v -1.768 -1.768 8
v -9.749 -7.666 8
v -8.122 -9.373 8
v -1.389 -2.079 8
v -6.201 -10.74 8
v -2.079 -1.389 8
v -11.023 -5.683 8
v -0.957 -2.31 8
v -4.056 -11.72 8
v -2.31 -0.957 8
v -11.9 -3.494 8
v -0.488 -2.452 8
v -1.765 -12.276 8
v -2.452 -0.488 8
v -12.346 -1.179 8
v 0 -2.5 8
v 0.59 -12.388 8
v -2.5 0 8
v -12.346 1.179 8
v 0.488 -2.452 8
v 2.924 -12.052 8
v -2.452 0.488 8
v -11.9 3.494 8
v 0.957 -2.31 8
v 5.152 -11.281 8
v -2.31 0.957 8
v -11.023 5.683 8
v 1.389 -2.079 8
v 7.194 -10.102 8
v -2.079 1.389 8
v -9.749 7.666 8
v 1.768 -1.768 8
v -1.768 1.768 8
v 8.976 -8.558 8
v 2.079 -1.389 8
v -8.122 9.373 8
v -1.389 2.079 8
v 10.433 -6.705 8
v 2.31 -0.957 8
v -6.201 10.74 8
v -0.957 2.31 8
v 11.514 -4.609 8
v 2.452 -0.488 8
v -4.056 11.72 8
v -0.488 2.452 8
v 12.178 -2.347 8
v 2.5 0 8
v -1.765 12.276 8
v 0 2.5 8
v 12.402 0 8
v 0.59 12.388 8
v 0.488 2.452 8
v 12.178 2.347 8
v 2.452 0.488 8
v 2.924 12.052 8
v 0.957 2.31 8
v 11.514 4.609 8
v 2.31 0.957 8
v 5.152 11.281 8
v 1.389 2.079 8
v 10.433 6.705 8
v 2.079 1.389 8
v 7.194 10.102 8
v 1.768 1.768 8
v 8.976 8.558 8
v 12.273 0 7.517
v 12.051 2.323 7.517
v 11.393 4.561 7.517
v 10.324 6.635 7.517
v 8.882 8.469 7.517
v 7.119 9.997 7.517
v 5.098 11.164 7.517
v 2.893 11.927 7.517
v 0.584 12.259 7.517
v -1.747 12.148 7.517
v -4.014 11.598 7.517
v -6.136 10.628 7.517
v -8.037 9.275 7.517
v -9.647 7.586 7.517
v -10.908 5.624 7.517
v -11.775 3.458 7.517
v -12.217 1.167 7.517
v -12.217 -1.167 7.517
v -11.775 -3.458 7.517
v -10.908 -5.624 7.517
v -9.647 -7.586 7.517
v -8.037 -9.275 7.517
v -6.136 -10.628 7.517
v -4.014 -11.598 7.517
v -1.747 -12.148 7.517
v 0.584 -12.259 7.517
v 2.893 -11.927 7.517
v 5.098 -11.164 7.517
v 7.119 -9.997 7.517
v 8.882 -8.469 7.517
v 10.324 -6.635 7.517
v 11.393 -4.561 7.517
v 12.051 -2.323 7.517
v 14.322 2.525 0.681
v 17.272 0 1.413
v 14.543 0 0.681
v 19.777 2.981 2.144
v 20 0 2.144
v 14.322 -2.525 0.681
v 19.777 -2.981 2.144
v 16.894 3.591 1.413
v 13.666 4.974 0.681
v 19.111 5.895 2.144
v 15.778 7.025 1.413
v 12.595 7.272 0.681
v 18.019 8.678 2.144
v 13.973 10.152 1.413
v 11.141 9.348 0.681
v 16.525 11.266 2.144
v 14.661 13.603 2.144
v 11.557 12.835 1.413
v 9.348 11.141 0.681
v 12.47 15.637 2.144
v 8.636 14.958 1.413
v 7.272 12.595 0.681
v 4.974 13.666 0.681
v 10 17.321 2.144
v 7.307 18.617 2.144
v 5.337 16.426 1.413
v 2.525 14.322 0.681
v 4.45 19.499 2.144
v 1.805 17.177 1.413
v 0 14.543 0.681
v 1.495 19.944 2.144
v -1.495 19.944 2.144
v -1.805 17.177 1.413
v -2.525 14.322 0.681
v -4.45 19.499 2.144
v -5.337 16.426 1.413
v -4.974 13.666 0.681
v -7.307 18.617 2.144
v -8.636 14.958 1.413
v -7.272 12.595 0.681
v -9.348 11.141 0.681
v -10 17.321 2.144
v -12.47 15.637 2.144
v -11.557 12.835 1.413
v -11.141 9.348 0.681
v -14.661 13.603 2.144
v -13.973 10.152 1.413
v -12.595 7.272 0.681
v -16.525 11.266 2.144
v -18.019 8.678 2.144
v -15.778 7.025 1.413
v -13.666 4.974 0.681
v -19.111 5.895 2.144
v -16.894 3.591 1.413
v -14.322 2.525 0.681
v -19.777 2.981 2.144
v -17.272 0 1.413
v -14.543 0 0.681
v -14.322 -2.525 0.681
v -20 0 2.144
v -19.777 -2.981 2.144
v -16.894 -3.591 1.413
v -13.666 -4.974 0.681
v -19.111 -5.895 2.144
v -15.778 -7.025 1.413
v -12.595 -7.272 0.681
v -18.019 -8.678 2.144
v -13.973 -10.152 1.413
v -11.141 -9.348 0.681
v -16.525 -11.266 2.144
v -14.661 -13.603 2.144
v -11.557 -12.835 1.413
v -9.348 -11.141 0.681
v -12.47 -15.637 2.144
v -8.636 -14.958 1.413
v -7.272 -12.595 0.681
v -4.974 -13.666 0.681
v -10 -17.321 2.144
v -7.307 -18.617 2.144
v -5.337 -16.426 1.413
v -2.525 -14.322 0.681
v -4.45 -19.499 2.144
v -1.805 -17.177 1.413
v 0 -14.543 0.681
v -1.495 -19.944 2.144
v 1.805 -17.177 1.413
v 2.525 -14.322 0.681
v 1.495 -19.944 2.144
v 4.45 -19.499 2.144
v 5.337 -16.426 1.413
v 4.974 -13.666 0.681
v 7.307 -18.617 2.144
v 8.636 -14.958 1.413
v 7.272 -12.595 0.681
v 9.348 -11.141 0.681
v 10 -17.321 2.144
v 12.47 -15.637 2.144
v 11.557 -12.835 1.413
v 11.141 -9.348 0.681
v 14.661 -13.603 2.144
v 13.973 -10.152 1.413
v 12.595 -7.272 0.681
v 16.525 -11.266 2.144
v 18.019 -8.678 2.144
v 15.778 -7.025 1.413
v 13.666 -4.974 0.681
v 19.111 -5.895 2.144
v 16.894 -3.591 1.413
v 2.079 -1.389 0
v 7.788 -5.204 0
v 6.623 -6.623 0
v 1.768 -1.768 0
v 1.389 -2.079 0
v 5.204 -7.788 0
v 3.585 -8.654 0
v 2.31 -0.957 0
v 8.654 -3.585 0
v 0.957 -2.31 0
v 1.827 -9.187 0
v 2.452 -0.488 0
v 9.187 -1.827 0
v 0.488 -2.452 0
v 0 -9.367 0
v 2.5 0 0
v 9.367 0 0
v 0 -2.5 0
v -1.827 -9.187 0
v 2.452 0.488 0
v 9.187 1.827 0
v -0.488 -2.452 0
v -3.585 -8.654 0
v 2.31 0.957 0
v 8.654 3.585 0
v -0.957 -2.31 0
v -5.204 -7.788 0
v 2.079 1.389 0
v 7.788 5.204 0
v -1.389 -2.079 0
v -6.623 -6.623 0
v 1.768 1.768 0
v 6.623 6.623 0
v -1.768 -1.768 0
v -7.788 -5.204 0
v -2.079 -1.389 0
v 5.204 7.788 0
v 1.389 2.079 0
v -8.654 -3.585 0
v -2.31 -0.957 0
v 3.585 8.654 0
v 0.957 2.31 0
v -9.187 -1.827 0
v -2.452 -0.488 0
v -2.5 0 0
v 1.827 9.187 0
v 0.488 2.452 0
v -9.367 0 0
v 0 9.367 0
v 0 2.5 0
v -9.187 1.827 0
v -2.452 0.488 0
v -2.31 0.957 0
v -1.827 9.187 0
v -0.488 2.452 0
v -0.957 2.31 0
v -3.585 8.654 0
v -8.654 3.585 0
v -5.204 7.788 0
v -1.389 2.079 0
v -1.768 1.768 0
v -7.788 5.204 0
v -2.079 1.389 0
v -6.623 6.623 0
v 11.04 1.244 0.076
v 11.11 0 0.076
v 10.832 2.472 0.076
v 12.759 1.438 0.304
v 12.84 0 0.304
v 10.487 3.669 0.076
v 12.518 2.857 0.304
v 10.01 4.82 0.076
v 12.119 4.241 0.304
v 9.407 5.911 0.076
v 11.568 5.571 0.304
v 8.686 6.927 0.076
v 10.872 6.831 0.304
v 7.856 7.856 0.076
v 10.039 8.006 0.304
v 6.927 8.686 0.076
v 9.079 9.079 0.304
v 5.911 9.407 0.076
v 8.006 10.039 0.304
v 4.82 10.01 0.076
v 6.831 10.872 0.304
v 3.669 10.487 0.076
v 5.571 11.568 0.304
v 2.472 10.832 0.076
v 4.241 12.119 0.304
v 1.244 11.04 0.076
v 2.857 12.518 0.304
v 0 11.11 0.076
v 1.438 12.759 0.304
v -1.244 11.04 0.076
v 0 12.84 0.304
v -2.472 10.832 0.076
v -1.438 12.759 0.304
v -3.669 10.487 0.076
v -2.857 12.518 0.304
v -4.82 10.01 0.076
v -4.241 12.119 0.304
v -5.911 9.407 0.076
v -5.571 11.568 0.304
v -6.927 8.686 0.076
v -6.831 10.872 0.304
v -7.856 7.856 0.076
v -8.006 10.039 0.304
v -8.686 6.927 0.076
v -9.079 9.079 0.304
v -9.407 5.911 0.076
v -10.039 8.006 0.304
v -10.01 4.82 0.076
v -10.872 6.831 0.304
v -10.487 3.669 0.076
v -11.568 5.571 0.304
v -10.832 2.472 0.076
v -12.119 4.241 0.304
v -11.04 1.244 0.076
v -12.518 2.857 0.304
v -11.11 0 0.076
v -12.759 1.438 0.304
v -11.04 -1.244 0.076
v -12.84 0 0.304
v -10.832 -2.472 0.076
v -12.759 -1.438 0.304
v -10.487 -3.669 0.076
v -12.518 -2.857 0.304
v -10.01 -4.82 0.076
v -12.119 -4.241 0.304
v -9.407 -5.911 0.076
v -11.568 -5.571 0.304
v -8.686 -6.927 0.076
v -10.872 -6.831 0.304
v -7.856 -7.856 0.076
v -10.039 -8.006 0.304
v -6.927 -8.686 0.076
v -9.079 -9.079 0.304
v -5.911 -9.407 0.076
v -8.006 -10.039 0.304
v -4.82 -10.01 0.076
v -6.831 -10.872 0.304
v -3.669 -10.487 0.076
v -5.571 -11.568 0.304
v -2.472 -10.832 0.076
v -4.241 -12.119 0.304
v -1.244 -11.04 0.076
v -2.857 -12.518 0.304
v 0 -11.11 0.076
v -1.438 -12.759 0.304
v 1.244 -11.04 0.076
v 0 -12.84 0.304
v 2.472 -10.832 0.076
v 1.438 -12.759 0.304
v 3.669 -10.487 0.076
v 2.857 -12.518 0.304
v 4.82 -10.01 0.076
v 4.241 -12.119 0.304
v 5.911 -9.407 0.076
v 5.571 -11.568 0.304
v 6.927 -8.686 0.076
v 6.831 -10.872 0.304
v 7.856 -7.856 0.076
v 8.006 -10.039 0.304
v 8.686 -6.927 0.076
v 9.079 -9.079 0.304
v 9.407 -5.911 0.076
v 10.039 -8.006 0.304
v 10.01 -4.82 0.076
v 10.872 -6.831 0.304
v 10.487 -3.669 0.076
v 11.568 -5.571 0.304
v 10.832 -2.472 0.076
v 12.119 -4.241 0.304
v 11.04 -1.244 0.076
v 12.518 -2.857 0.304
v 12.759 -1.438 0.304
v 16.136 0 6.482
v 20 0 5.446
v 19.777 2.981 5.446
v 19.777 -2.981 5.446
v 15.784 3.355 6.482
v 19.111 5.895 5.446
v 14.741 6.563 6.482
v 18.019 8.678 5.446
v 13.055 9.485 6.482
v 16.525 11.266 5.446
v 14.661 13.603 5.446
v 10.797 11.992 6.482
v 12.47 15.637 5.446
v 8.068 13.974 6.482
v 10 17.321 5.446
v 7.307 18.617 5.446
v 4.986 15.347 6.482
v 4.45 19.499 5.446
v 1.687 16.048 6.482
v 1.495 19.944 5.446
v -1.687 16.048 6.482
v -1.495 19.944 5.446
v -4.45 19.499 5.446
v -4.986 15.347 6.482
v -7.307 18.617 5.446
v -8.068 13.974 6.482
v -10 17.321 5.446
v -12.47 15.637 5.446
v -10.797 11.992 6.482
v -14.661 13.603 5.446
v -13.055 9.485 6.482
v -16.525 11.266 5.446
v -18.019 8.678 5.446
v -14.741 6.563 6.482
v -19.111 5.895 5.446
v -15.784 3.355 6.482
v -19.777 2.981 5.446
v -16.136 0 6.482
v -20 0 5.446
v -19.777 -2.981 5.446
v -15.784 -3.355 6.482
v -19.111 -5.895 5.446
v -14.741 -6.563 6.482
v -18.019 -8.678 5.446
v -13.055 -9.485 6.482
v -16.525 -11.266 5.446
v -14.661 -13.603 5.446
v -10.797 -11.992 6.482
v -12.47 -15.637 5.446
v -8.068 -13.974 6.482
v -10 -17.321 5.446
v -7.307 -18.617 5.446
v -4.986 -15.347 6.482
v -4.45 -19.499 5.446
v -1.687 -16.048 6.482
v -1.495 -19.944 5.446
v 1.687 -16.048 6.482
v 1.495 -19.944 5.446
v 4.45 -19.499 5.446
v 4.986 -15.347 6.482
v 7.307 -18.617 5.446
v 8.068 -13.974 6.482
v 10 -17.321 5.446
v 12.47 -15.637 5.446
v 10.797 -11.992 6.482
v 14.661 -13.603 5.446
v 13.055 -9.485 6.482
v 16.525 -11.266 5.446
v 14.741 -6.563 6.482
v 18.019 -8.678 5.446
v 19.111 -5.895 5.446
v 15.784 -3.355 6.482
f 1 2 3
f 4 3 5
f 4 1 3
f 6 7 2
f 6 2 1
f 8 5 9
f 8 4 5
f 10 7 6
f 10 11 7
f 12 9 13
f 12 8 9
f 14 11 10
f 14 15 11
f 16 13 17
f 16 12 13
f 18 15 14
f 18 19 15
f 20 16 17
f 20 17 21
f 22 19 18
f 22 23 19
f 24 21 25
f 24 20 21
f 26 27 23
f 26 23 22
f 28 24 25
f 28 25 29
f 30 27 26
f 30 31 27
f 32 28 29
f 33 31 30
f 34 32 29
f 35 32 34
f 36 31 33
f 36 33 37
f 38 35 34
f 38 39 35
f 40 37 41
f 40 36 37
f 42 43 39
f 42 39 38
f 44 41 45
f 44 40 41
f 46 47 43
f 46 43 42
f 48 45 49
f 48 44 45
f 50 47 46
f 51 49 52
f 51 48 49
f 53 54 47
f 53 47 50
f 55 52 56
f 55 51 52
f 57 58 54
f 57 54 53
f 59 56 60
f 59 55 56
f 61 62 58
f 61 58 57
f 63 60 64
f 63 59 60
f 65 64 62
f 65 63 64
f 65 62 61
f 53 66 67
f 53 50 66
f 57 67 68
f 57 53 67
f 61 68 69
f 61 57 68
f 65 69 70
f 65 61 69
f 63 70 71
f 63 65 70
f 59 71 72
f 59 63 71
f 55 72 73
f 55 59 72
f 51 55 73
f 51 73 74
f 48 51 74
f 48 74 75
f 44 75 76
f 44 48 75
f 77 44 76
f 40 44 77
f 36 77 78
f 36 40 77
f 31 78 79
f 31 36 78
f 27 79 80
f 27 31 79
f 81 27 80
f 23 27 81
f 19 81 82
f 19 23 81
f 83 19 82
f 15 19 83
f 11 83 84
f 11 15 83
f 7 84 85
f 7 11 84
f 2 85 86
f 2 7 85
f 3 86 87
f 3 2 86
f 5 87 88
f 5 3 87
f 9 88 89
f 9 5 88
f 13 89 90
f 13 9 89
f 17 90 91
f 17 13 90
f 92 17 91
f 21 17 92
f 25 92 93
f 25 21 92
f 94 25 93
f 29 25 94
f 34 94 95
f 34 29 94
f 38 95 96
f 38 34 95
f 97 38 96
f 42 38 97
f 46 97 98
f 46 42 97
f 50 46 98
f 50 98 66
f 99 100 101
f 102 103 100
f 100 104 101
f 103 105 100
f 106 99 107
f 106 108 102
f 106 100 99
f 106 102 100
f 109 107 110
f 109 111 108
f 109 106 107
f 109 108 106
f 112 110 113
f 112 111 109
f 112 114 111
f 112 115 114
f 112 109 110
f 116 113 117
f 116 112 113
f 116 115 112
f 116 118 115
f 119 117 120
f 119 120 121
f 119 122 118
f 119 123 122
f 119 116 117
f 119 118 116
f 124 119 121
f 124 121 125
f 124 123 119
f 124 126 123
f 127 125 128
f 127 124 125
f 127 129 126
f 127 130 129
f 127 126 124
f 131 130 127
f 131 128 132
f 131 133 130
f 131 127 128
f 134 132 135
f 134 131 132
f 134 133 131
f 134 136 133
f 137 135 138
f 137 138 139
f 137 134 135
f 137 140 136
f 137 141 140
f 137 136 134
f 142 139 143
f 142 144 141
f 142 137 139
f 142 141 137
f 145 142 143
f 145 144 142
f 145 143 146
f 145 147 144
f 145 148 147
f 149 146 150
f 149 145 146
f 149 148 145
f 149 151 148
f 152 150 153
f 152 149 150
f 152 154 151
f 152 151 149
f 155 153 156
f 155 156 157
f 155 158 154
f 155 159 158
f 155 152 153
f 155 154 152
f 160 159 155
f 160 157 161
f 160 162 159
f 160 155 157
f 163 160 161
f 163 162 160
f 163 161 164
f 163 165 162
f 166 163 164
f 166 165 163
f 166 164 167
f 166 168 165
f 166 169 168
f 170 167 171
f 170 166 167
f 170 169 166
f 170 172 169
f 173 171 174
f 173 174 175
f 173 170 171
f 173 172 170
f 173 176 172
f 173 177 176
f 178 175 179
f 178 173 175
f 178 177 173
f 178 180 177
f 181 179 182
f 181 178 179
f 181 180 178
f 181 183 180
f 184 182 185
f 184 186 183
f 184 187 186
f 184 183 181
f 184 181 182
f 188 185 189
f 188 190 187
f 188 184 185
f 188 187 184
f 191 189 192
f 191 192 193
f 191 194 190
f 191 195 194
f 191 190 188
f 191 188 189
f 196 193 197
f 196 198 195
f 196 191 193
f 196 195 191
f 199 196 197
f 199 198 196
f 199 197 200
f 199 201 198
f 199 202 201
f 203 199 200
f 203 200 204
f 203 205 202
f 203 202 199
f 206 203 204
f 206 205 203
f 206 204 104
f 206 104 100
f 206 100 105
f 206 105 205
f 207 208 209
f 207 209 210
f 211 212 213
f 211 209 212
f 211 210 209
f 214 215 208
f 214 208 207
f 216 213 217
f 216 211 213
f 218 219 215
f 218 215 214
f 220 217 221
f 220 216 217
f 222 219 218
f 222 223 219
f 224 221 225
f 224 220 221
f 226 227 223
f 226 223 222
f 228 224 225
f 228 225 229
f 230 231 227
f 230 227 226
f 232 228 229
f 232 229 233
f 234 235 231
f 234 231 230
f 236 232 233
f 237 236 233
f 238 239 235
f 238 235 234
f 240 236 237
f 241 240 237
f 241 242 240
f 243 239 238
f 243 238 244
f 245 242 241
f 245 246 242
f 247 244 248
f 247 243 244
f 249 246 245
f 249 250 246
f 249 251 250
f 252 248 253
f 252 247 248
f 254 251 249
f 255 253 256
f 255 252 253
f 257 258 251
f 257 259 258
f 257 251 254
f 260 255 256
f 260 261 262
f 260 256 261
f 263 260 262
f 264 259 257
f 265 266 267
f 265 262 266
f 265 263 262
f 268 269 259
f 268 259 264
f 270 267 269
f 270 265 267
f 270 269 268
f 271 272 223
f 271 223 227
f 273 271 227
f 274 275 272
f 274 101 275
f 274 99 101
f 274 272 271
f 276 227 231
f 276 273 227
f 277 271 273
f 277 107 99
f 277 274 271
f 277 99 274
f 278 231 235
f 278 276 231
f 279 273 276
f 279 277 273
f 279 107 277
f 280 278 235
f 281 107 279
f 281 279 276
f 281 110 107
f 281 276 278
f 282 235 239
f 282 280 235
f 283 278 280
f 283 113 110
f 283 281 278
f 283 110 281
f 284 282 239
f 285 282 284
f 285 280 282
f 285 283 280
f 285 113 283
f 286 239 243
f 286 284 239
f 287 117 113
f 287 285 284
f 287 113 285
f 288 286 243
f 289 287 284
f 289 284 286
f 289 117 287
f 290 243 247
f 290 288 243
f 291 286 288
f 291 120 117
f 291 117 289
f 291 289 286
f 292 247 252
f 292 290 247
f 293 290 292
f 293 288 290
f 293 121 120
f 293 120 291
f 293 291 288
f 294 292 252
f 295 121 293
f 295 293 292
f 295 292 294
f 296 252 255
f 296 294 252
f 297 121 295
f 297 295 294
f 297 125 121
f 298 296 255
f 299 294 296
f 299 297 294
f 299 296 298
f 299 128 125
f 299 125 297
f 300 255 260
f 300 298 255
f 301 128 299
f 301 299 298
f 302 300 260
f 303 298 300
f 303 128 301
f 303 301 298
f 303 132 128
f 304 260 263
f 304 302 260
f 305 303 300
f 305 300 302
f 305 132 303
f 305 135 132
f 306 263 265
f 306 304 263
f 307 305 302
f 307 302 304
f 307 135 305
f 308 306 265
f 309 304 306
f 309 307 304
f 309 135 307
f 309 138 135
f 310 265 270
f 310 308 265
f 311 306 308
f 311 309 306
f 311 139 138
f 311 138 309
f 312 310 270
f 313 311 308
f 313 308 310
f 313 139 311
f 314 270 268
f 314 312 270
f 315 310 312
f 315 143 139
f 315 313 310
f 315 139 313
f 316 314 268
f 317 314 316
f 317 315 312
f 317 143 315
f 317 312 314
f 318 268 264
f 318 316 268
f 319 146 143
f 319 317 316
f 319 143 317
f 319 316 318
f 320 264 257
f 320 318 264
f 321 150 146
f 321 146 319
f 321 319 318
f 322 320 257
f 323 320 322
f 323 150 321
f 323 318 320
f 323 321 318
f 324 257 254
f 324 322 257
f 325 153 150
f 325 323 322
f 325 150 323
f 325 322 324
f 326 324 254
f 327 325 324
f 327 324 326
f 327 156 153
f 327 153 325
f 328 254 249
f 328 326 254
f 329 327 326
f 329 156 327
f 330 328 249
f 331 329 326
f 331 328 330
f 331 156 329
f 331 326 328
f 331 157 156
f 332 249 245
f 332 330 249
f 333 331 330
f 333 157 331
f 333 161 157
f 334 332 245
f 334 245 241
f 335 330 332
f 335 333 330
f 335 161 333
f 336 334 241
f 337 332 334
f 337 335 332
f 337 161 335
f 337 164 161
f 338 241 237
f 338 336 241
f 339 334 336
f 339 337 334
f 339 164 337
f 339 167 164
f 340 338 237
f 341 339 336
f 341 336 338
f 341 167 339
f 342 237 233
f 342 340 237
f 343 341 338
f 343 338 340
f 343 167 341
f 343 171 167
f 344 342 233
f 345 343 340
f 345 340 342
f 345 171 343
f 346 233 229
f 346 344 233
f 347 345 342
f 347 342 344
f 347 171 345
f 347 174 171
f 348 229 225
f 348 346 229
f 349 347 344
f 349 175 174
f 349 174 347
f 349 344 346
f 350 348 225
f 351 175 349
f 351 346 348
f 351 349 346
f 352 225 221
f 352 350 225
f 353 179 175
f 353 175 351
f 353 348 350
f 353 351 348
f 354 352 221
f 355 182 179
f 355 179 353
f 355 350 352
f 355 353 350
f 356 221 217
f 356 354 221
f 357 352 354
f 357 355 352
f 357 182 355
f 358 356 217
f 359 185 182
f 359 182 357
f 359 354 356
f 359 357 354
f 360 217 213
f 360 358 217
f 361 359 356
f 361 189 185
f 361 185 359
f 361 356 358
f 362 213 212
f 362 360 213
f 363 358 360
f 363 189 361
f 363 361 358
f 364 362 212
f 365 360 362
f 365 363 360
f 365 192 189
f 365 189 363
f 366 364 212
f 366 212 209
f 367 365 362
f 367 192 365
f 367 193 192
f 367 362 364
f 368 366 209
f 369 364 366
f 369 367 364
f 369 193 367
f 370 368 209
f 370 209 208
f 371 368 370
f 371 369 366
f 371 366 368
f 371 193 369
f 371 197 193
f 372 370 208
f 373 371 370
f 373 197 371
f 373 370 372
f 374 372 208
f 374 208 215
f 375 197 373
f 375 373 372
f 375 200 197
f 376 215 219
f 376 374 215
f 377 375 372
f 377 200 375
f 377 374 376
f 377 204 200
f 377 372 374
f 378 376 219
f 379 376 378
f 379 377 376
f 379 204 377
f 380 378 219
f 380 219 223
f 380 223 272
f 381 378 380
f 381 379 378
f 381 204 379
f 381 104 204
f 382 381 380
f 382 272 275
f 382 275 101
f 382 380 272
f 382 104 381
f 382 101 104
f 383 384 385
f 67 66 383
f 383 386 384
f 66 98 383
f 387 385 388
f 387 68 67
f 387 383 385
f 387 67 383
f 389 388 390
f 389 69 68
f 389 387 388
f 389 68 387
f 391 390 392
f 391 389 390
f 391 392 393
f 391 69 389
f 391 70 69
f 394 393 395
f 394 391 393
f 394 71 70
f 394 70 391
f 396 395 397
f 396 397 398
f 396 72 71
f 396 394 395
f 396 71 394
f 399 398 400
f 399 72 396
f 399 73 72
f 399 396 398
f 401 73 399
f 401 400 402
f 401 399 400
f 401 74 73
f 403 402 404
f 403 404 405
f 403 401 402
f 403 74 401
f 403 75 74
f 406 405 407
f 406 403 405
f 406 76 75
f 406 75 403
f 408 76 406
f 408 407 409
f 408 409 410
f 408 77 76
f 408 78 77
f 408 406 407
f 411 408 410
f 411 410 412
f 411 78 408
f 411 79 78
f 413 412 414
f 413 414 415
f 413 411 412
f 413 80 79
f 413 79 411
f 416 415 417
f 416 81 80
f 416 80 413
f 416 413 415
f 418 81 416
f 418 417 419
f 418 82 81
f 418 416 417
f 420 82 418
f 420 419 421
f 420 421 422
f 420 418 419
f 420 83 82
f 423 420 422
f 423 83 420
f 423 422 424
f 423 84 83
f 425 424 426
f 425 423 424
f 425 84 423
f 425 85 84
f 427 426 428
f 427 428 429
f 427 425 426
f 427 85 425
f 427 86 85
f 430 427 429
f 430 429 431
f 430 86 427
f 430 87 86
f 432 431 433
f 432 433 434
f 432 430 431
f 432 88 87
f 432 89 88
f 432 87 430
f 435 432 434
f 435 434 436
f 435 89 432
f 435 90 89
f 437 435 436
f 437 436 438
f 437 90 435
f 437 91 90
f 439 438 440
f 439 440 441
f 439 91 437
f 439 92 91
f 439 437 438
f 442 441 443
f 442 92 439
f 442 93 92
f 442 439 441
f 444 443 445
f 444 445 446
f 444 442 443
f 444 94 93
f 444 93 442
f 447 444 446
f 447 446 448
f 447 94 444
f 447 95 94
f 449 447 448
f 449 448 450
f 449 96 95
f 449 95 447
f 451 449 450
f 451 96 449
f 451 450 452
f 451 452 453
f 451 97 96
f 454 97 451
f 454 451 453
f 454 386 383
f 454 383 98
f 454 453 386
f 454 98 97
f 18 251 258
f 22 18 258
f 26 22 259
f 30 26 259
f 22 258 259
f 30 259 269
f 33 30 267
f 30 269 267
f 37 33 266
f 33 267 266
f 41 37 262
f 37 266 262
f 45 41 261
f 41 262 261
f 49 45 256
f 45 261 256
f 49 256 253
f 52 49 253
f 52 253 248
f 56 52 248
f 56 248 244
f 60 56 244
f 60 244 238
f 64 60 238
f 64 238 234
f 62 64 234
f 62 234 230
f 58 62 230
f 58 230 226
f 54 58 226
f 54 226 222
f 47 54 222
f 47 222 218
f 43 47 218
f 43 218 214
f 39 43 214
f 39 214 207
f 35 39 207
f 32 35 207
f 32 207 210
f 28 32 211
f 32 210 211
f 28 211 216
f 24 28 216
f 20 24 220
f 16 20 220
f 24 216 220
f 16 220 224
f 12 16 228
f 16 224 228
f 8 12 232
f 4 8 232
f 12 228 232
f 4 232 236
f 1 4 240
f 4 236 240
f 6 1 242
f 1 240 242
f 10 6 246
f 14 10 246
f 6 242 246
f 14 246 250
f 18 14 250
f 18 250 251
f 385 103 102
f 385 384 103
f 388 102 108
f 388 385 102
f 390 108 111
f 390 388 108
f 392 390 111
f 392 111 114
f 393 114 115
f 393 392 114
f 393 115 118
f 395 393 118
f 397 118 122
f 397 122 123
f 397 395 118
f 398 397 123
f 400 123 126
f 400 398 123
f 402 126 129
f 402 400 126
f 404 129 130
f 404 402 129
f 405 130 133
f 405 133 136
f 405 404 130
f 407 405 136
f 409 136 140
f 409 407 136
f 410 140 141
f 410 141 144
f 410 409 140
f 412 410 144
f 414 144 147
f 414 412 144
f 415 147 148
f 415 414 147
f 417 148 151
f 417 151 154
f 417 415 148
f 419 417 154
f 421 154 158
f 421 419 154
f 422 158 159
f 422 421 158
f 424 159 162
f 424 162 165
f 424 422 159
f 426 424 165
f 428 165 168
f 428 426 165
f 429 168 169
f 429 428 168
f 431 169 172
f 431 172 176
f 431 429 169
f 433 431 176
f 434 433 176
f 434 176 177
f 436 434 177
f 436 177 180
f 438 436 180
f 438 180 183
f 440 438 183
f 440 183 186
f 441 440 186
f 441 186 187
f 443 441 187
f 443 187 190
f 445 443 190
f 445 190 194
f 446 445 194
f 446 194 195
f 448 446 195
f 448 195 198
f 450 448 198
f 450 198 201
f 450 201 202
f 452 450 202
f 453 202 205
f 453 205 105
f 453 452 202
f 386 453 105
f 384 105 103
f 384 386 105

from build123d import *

# Parameters (mm, degrees)
F0_W = 5
F0_H = 1.6
F3_D = 5
F4_R = 20


with BuildPart() as f1:
    # F0 (on Front) → F1 (revolve)
    with BuildSketch(Plane.XZ):
        Polygon((0, 8), (0, 1.6), (5, 1.6), (10, 1.6), (10, 0), (12, 0), (20, 2.1435935394), (20, 5.446484726), (12.2725933897, 7.5170370869), (10.4701512597, 8), align=None)
        with Locations((2.5, 0.8)):
            Rectangle(F0_W, F0_H)
        Polygon((12.4020029122, 8), (10.4701512597, 8), (12.2725933897, 7.5170370869), align=None)
        with Locations((7.5, 0.8)):
            Rectangle(F0_W, F0_H)
    revolve(axis=Axis((0, 0, 4), (0, 0, 1)))

    # F3 (through all)
    with Locations(Plane.XY.offset(8)):
        with Locations((0, 0)):
            Hole(F3_D / 2)

    # F4
    f4_edges = [f1.edges().sort_by_distance(p)[0] for p in [
        (-12, 0, 0),
    ]]
    fillet(f4_edges, radius=F4_R)


solid = f1.part
